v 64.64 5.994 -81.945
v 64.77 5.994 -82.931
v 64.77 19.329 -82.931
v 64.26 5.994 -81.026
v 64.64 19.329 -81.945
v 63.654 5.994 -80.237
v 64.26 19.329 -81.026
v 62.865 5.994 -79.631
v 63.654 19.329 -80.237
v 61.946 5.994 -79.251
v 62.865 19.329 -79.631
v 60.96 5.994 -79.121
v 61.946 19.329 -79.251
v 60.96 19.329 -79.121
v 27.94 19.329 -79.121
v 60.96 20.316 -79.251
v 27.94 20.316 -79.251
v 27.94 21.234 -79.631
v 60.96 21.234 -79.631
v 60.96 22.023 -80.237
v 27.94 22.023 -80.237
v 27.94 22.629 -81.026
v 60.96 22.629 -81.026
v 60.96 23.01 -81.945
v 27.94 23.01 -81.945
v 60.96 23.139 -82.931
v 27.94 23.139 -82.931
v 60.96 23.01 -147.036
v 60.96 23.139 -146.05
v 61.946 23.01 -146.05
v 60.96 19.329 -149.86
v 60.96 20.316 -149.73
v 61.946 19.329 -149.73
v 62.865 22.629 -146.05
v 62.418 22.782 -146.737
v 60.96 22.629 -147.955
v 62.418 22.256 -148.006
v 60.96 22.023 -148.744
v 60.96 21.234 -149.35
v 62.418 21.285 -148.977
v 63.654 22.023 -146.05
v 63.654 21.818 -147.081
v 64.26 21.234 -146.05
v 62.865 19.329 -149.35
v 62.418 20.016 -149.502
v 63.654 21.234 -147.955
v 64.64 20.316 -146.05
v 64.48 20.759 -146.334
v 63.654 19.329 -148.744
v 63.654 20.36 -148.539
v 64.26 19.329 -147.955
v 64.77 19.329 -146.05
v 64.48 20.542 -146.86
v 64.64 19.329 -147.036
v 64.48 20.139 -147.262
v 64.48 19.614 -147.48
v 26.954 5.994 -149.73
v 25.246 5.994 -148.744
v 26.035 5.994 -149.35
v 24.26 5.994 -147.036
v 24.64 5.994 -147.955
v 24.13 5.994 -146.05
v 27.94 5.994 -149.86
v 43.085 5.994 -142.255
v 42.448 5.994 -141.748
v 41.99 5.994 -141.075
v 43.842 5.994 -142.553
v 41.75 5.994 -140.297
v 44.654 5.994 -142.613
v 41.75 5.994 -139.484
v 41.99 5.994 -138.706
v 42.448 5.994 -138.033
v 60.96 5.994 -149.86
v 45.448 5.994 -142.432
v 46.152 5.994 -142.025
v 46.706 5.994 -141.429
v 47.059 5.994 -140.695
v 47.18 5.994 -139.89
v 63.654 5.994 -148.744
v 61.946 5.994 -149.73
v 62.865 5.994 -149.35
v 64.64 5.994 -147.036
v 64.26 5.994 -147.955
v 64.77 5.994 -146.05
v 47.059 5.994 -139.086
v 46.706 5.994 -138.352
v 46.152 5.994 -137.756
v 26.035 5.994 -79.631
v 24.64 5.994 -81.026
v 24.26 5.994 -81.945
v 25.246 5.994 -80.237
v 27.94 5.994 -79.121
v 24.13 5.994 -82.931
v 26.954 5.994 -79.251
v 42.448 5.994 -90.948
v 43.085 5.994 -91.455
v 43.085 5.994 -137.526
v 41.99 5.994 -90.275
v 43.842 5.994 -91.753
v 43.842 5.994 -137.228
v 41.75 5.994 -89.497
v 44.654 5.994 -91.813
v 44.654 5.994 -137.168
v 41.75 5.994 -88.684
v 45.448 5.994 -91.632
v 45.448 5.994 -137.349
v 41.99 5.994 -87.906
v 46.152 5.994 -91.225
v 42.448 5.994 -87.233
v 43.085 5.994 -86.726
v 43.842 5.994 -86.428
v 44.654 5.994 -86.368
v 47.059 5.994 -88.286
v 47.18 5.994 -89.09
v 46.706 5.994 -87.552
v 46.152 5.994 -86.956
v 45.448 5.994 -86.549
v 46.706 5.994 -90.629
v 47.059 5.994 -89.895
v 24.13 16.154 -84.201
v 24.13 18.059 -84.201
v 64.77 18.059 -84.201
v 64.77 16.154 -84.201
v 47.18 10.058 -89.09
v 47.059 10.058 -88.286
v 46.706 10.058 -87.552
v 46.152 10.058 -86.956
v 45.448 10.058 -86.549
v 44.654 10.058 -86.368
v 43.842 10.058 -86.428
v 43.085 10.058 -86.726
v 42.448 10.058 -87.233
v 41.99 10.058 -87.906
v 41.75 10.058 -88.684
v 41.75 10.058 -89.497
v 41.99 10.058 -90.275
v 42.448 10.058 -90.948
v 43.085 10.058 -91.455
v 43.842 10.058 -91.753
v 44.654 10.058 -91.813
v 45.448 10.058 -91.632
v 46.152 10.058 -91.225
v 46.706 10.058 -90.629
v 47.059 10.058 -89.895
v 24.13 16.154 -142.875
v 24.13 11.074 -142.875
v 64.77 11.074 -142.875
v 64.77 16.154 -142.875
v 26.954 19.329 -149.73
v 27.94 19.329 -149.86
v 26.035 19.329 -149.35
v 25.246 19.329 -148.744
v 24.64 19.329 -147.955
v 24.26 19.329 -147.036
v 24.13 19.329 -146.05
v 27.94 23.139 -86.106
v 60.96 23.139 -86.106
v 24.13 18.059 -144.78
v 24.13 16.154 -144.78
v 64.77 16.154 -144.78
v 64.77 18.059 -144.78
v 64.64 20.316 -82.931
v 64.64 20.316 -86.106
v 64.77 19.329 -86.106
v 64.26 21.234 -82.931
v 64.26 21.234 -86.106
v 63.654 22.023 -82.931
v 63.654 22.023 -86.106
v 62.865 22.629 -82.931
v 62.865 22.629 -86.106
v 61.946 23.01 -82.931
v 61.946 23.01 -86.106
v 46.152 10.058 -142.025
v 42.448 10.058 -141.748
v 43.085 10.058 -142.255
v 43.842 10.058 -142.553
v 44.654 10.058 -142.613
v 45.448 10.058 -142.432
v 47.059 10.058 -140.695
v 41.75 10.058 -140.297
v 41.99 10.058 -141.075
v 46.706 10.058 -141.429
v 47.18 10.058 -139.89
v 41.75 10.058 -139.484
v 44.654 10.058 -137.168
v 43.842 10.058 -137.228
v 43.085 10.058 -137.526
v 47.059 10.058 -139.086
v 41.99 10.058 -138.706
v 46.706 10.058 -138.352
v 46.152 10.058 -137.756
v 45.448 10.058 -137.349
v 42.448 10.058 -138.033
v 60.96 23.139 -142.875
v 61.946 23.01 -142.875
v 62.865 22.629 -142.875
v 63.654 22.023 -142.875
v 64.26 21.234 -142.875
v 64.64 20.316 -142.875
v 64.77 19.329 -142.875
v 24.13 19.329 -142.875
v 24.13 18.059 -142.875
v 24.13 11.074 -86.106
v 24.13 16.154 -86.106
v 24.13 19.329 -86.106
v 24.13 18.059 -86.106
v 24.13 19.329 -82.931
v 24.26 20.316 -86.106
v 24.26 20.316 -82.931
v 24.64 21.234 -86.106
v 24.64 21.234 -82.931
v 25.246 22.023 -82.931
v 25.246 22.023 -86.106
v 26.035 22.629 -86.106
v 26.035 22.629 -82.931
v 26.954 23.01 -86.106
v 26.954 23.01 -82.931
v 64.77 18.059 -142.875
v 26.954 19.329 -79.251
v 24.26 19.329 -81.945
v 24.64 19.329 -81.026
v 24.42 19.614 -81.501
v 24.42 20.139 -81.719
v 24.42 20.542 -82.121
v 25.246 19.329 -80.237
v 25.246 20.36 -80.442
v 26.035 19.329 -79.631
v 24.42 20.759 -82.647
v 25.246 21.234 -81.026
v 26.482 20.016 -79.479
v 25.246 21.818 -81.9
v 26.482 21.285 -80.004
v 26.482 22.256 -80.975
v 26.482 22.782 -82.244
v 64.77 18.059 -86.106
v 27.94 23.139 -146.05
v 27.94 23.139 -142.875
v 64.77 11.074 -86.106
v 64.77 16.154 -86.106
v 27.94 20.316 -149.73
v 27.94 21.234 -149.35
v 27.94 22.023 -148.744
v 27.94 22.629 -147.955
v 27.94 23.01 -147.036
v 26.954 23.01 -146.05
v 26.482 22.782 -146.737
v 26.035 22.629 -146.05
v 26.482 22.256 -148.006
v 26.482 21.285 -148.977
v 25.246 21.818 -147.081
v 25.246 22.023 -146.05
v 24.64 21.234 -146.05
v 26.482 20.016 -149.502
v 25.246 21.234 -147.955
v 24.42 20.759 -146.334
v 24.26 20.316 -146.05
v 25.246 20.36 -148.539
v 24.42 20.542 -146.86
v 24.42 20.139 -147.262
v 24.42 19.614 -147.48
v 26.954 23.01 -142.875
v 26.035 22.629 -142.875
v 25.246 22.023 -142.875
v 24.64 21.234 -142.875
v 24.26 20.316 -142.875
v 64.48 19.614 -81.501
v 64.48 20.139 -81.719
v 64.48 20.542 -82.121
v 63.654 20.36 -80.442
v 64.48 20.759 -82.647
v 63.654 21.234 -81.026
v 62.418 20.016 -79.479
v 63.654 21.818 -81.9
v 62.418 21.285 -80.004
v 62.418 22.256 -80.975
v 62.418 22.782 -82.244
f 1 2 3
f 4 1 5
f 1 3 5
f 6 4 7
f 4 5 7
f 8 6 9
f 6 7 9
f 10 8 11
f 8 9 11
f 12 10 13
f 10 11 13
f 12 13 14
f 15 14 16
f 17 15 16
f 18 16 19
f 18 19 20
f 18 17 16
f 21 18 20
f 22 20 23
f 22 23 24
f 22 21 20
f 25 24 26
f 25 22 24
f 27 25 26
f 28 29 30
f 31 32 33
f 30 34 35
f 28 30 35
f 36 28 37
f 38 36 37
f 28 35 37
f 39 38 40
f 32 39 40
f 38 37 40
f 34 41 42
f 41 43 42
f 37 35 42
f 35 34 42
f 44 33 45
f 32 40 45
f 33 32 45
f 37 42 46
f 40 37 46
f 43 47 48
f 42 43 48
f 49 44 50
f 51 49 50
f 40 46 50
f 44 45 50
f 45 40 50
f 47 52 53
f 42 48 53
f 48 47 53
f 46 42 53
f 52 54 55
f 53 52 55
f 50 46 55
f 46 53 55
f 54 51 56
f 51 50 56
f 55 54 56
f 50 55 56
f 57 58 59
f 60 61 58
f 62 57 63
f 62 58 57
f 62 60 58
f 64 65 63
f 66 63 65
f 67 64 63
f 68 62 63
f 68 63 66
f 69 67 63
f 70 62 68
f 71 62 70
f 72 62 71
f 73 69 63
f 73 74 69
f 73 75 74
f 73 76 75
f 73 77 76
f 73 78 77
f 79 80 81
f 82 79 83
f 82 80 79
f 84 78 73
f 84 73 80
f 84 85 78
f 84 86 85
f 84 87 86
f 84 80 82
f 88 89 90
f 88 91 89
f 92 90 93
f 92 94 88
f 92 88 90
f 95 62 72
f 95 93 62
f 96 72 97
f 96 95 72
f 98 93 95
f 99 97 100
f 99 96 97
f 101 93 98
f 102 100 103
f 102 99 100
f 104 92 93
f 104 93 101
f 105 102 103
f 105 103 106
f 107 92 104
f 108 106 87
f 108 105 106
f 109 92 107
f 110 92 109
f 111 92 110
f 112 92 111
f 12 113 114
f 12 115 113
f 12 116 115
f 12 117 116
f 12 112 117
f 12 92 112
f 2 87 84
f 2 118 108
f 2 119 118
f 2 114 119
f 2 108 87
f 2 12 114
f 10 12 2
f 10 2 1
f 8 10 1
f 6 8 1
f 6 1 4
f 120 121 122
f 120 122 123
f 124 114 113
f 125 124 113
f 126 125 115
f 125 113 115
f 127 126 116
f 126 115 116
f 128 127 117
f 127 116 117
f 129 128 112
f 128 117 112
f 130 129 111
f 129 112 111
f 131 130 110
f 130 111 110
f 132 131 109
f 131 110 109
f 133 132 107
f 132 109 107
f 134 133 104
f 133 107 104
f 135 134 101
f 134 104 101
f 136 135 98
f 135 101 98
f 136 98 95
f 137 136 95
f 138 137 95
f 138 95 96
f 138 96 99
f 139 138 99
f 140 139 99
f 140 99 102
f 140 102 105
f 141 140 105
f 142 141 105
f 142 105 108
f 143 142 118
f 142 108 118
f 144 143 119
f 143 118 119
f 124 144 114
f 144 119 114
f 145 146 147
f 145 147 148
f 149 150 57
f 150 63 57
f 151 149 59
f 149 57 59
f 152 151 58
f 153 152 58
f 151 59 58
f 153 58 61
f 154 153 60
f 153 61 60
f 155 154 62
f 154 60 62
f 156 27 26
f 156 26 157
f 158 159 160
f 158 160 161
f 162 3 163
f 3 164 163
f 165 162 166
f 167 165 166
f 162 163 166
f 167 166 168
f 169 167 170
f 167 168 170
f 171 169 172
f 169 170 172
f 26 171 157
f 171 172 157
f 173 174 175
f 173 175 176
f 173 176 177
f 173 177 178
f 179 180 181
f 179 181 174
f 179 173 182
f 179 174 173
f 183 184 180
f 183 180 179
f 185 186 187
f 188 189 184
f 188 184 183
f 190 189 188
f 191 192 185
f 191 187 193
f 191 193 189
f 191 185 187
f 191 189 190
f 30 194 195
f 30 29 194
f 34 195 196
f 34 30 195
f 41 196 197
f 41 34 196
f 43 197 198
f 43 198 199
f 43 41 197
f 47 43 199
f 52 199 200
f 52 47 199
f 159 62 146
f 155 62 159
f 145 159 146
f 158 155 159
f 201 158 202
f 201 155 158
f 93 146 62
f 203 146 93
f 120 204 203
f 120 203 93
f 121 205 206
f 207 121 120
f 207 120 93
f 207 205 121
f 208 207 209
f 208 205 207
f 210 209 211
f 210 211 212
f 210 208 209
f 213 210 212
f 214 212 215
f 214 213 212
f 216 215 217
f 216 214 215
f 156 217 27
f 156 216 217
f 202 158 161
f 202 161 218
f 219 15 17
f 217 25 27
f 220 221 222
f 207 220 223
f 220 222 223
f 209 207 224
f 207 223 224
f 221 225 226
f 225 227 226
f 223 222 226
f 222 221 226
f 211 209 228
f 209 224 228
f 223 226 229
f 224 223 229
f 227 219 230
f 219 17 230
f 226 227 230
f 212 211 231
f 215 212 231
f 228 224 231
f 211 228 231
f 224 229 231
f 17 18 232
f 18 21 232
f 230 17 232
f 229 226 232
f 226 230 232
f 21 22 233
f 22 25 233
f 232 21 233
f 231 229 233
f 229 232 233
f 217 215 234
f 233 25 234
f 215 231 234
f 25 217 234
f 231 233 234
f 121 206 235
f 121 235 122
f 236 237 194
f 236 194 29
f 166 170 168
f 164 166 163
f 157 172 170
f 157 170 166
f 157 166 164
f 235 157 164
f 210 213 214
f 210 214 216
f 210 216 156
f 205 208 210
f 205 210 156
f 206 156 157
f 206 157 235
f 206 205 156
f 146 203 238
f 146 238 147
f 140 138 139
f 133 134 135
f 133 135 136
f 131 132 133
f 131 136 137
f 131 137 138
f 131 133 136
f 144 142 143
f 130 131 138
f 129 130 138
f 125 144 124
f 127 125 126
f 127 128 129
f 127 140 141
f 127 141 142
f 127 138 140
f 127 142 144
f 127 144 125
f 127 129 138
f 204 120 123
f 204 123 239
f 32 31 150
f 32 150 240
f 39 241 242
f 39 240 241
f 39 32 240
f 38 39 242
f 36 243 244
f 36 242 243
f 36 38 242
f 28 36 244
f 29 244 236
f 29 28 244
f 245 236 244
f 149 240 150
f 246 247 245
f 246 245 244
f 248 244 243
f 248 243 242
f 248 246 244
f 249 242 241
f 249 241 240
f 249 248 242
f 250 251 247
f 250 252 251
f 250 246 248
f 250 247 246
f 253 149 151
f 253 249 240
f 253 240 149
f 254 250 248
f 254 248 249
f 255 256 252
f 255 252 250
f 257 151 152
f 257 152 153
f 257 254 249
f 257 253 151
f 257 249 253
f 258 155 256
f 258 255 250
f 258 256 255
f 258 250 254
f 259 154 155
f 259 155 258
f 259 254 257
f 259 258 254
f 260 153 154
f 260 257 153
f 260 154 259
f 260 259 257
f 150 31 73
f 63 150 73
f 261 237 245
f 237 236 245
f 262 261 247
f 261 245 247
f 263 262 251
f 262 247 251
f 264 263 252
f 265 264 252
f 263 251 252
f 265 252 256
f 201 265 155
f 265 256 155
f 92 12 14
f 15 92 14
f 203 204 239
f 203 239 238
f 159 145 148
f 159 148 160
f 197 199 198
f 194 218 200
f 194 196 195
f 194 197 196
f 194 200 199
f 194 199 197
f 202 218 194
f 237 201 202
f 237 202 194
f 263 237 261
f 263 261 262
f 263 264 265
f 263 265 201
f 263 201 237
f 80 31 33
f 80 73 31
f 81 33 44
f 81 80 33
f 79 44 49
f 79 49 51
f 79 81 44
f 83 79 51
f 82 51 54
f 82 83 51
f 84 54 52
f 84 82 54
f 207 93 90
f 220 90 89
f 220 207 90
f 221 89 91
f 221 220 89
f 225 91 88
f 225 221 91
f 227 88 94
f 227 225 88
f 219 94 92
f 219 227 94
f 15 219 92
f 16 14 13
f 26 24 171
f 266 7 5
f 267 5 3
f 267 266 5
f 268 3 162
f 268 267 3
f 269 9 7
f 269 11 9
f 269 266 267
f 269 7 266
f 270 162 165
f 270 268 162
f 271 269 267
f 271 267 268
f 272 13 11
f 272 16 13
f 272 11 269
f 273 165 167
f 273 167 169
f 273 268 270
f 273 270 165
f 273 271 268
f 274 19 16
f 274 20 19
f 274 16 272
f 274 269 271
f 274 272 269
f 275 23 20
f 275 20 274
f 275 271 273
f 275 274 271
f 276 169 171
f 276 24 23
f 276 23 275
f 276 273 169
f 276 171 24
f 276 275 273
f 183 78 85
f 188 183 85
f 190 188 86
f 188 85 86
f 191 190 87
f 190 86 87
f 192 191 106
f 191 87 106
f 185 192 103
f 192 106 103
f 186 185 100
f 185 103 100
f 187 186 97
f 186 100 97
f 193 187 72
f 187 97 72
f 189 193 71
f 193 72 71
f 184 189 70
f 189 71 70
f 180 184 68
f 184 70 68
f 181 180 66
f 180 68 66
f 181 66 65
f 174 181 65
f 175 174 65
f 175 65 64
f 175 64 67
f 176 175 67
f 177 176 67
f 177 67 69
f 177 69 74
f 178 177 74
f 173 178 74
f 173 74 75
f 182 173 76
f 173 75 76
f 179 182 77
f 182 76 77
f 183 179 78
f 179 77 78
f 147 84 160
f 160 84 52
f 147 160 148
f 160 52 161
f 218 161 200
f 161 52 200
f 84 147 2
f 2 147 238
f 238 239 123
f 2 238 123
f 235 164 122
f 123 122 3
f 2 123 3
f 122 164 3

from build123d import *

# Parameters (mm, degrees)
SKETCH2_W               = 88.9
SKETCH2_H               = 152.4
BOSS_EXTRUDE1_DEPTH     = 5.9944
SKETCH4_R               = 2.7305
CUT_EXTRUDE2_DEPTH      = 1
CUT_EXTRUDE2_DEPTH_BACK = 6.9944
BOSS_EXTRUDE3_DEPTH     = 20.32
FILLET3_R               = 3.81
FILLET6_R               = 3.81
SKETCH7_W               = 2.54
SKETCH7_H               = 152.4
CUT_EXTRUDE3_DEPTH      = 18.145
CUT_EXTRUDE3_DEPTH_BACK = 6.9944
SKETCH8_W               = 86.36
SKETCH8_H               = 152.4
SKETCH8_R               = 2.7305
CUT_EXTRUDE5_DEPTH      = 5.9944
SKETCH9_R               = 2.7305
CUT_EXTRUDE6_DEPTH      = 4.064


with BuildPart() as part:
    # Sketch2 → Boss-Extrude1 (new body)
    with BuildSketch(Plane(origin=(0, 0, 0), x_dir=(1, 0, 0), z_dir=(0, 1, 0))):
        with Locations((44.45, 76.2)):
            Rectangle(SKETCH2_W, SKETCH2_H)
    extrude(amount=BOSS_EXTRUDE1_DEPTH)

    # Sketch4 → Cut-Extrude2 (cut, two sides)
    with BuildSketch(Plane(origin=(0, 5.9944, 0), x_dir=(1, 0, 0), z_dir=(0, 1, 0))) as cut_extrude2_sk:
        with Locations((45.72, 109.871331367)):
            Circle(SKETCH4_R)
        with Locations((45.72, 33.671331367)):
            Circle(SKETCH4_R)
    extrude(amount=CUT_EXTRUDE2_DEPTH, mode=Mode.SUBTRACT)
    extrude(cut_extrude2_sk.sketch, amount=-CUT_EXTRUDE2_DEPTH_BACK, mode=Mode.SUBTRACT)

    # Sketch6 → Boss-Extrude3 (add, symmetric)
    with BuildSketch(Plane.ZY.offset(-44.45)):
        Polygon((-149.86, 5.9944), (-79.121, 5.9944), (-79.121, 23.1394), (-86.106, 23.1394), (-86.106, 18.0594), (-84.201, 18.0594), (-84.201, 16.1544), (-86.106, 16.1544), (-86.106, 11.0744), (-142.875, 11.0744), (-142.875, 16.1544), (-144.78, 16.1544), (-144.78, 18.0594), (-142.875, 18.0594), (-142.875, 23.1394), (-149.86, 23.1394), align=None)
    extrude(amount=BOSS_EXTRUDE3_DEPTH, both=True)

    # Fillet3
    fillet3_edges = [part.edges().sort_by_distance(p)[0] for p in [
        (44.45, 23.1394, -149.86),
        (44.45, 23.1394, -79.121),
    ]]
    fillet(fillet3_edges, radius=FILLET3_R)

    # Fillet6
    fillet6_edges = [part.edges().sort_by_distance(p)[0] for p in [
        (24.13, 12.6619, -149.86),
        (64.77, 12.6619, -79.121),
        (24.13, 23.1394, -84.5185),
        (24.13, 12.6619, -79.121),
        (64.77, 23.1394, -84.5185),
        (64.77, 12.6619, -149.86),
        (64.77, 23.1394, -144.4625),
        (64.77, 22.023476836, -148.744076836),
        (64.77, 22.023476836, -80.236923164),
        (24.13, 23.1394, -144.4625),
        (24.13, 22.023476836, -148.744076836),
        (24.13, 22.023476836, -80.236923164),
    ]]
    fillet(fillet6_edges, radius=FILLET6_R)

    # Sketch7 → Cut-Extrude3 (cut, two sides)
    with BuildSketch(Plane(origin=(0, 5.9944, 0), x_dir=(1, 0, 0), z_dir=(0, 1, 0))) as cut_extrude3_sk:
        with Locations((1.27, 76.2)):
            Rectangle(SKETCH7_W, SKETCH7_H)
    extrude(amount=CUT_EXTRUDE3_DEPTH, mode=Mode.SUBTRACT)
    extrude(cut_extrude3_sk.sketch, amount=-CUT_EXTRUDE3_DEPTH_BACK, mode=Mode.SUBTRACT)

    # Sketch8 → Cut-Extrude5 (cut)
    with BuildSketch(Plane.XZ):
        with Locations((45.72, -76.2)):
            Rectangle(SKETCH8_W, SKETCH8_H)
        with Locations((45.72, -33.671331367)):
            Circle(SKETCH8_R, mode=Mode.SUBTRACT)
        with Locations((45.72, -109.871331367)):
            Circle(SKETCH8_R, mode=Mode.SUBTRACT)
    extrude(amount=-CUT_EXTRUDE5_DEPTH, mode=Mode.SUBTRACT)

    # Sketch9 → Cut-Extrude6 (cut)
    with BuildSketch(Plane.XZ.offset(-5.9944)):
        with Locations((44.45, -89.0905)):
            Circle(SKETCH9_R)
        with Locations((44.45, -139.8905)):
            Circle(SKETCH9_R)
    extrude(amount=-CUT_EXTRUDE6_DEPTH, mode=Mode.SUBTRACT)


solid = part.part
